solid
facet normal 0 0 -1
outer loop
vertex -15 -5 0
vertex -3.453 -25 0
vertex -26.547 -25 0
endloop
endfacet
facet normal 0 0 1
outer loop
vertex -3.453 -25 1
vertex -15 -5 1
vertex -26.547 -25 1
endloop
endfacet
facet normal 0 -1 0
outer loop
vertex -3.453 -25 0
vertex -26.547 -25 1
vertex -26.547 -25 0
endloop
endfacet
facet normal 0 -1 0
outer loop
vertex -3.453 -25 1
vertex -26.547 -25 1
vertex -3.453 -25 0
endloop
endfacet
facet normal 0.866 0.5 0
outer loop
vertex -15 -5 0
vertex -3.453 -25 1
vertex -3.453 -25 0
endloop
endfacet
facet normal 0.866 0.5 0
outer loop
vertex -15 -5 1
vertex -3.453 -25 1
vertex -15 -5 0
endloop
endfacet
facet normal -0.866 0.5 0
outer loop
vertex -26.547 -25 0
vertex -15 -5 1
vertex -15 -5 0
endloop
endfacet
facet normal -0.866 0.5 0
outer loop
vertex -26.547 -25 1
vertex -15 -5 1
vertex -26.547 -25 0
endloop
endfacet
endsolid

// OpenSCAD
/*
Triangles.scad
 Author: Tim Koopman
 https://github.com/tkoopman/Delta-Diamond/blob/master/OpenSCAD/Triangles.scad

         angleCA
           /|\
        a / H \ c
         /  |  \
 angleAB ------- angleBC
            b

Standard Parameters
	center: true/false
		If true same as centerXYZ = [true, true, true]

	centerXYZ: Vector of 3 true/false values [CenterX, CenterY, CenterZ]
		center must be left undef

	height: The 3D height of the Triangle. Ignored if heights defined

	heights: Vector of 3 height values heights @ [angleAB, angleBC, angleCA]
		If CenterZ is true each height will be centered individually, this means
		the shape will be different depending on CenterZ. Most times you will want
		CenterZ to be true to get the shape most people want.
*/

/* 
Triangle
	a: Length of side a
	b: Length of side b
	angle: angle at point angleAB
*/
module Triangle(
			a, b, angle, height=1, heights=undef,
			center=undef, centerXYZ=[false,false,false])
{
	// Calculate Heights at each point
	heightAB = ((heights==undef) ? height : heights[0])/2;
	heightBC = ((heights==undef) ? height : heights[1])/2;
	heightCA = ((heights==undef) ? height : heights[2])/2;
	centerZ = (center || (center==undef && centerXYZ[2]))?0:max(heightAB,heightBC,heightCA);

	// Calculate Offsets for centering
	offsetX = (center || (center==undef && centerXYZ[0]))?((cos(angle)*a)+b)/3:0;
	offsetY = (center || (center==undef && centerXYZ[1]))?(sin(angle)*a)/3:0;
	
	pointAB1 = [-offsetX,-offsetY, centerZ-heightAB];
	pointAB2 = [-offsetX,-offsetY, centerZ+heightAB];
	pointBC1 = [b-offsetX,-offsetY, centerZ-heightBC];
	pointBC2 = [b-offsetX,-offsetY, centerZ+heightBC];
	pointCA1 = [(cos(angle)*a)-offsetX,(sin(angle)*a)-offsetY, centerZ-heightCA];
	pointCA2 = [(cos(angle)*a)-offsetX,(sin(angle)*a)-offsetY, centerZ+heightCA];

	polyhedron(
		points=[	pointAB1, pointBC1, pointCA1,
					pointAB2, pointBC2, pointCA2 ],
		triangles=[	
			[0, 1, 2],
			[3, 5, 4],
			[0, 3, 1],
			[1, 3, 4],
			[1, 4, 2],
			[2, 4, 5],
			[2, 5, 0],
			[0, 5, 3] ] );
}

/*
Isosceles Triangle
	Exactly 2 of the following paramaters must be defined.
	If all 3 defined H will be ignored.
	b: length of side b
	angle: angle at points angleAB & angleBC.
*/
module Isosceles_Triangle(
			b, angle, H=undef, height=1, heights=undef,
			center=undef, centerXYZ=[true, false, false])
{
	valid = 	(angle!=undef)?((angle < 90) && (b!=undef||H!=undef)) : (b!=undef&&H!=undef);
	ANGLE = (angle!=undef) ? angle : atan(H / (b/2));
	a = (b==undef)?(H/sin((180-(angle*2))/2)) : 
		 (b / cos(ANGLE))/2;
	B = (b==undef)? (cos(angle)*a)*2:b;
	if (valid)
	{
		Triangle(a=a, b=B, angle=ANGLE, height=height, heights=heights,
					center=center, centerXYZ=centerXYZ);
	} else {
		echo("Invalid Isosceles_Triangle. Must specify any 2 of b, angle and H, and if angle used angle must be less than 90");
	}
}

/*
Right Angled Triangle
	Create a Right Angled Triangle where the hypotenuse will be calculated.

       |\
      a| \
       |  \
       ----
         b
	a: length of side a
	b: length of side b
*/
module Right_Angled_Triangle(
			a, b, height=1, heights=undef,
			center=undef, centerXYZ=[false, false, false])
{
	Triangle(a=a, b=b, angle=90, height=height, heights=heights,
				center=center, centerXYZ=centerXYZ);
}

/*
Wedge
	Is same as Right Angled Triangle with 2 different heights, and rotated.
	Good for creating support structures.
*/
module Wedge(a, b, w1, w2)
{
	rotate([90,0,0])
		Right_Angled_Triangle(a, b, heights=[w1, w2, w1], centerXYZ=[false, false, true]);
}

/*
Equilateral Triangle
	Create a Equilateral Triangle.

	l: Length of all sides (a, b & c)
	H: Triangle size will be based on the this 2D height
		When using H, l is ignored.
*/
module Equilateral_Triangle(
			l=10, H=undef, height=1, heights=undef,
			center=undef, centerXYZ=[true,false,false])
{
	L = (H==undef)?l:H/sin(60);
	Triangle(a=L,b=L,angle=60,height=height, heights=heights,
				center=center, centerXYZ=centerXYZ);
}

/*
Trapezoid
	Create a Basic Trapezoid (Based on Isosceles_Triangle)

            d
          /----\
         /  |   \
     a  /   H    \ c
       /    |     \
 angle ------------ angle
            b

	b: Length of side b
	angle: Angle at points angleAB & angleBC
	H: The 2D height at which the triangle should be cut to create the trapezoid
	heights: If vector of size 3 (Standard for triangles) both cd & da will be the same height, if vector have 4 values [ab,bc,cd,da] than each point can have different heights.
*/
module Trapezoid(
			b, angle=60, H, height=1, heights=undef,
			center=undef, centerXYZ=[true,false,false])
{
	validAngle = (angle < 90);
	adX = H / tan(angle);

	// Calculate Heights at each point
	heightAB = ((heights==undef) ? height : heights[0])/2;
	heightBC = ((heights==undef) ? height : heights[1])/2;
	heightCD = ((heights==undef) ? height : heights[2])/2;
	heightDA = ((heights==undef) ? height : ((len(heights) > 3)?heights[3]:heights[2]))/2;

	// Centers
	centerX = (center || (center==undef && centerXYZ[0]))?0:b/2;
	centerY = (center || (center==undef && centerXYZ[1]))?0:H/2;
	centerZ = (center || (center==undef && centerXYZ[2]))?0:max(heightAB,heightBC,heightCD,heightDA);

	// Points
	y = H/2;
	bx = b/2;
	dx = (b-(adX*2))/2;

	pointAB1 = [centerX-bx, centerY-y, centerZ-heightAB];
	pointAB2 = [centerX-bx, centerY-y, centerZ+heightAB];
	pointBC1 = [centerX+bx, centerY-y, centerZ-heightBC];
	pointBC2 = [centerX+bx, centerY-y, centerZ+heightBC];
	pointCD1 = [centerX+dx, centerY+y, centerZ-heightCD];
	pointCD2 = [centerX+dx, centerY+y, centerZ+heightCD];
	pointDA1 = [centerX-dx, centerY+y, centerZ-heightDA];
	pointDA2 = [centerX-dx, centerY+y, centerZ+heightDA];

	validH = (adX < b/2);

	if (validAngle && validH)
	{
		polyhedron(
			points=[	pointAB1, pointBC1, pointCD1, pointDA1,
						pointAB2, pointBC2, pointCD2, pointDA2 ],
			triangles=[	
				[0, 1, 2],
				[0, 2, 3],
				[4, 6, 5],
				[4, 7, 6],
				[0, 4, 1],
				[1, 4, 5],
				[1, 5, 2],
				[2, 5, 6],
				[2, 6, 3],
				[3, 6, 7],
				[3, 7, 0],
				[0, 7, 4]	] );
	} else {
		if (!validAngle) echo("Trapezoid invalid, angle must be less than 90");
		else echo("Trapezoid invalid, H is larger than triangle");
	}
}


// Examples
//Triangle(a=5, b=15, angle=33, centerXYZ=[true,false,false]);
//translate([20,0,0]) Right_Angled_Triangle(a=5, b=20, centerXYZ=[false,true,false]);
//translate([45,0,0]) Wedge(a=5, b=20, w1=10, w2=5);
//translate([-20,0,0]) Trapezoid(b=20, angle=33, H=4, height=5, centerXYZ=[true,false,true]);

//translate([0,10,0]) Isosceles_Triangle(b=20, angle=33);
//translate([30,10,0]) Isosceles_Triangle(b=20, H=5);
//translate([-30,10,0]) Isosceles_Triangle(angle=33, H=5, center=true);

//translate([15,-25,0]) Equilateral_Triangle(l=20);
translate([-15,-25,0]) Equilateral_Triangle(H=20);
